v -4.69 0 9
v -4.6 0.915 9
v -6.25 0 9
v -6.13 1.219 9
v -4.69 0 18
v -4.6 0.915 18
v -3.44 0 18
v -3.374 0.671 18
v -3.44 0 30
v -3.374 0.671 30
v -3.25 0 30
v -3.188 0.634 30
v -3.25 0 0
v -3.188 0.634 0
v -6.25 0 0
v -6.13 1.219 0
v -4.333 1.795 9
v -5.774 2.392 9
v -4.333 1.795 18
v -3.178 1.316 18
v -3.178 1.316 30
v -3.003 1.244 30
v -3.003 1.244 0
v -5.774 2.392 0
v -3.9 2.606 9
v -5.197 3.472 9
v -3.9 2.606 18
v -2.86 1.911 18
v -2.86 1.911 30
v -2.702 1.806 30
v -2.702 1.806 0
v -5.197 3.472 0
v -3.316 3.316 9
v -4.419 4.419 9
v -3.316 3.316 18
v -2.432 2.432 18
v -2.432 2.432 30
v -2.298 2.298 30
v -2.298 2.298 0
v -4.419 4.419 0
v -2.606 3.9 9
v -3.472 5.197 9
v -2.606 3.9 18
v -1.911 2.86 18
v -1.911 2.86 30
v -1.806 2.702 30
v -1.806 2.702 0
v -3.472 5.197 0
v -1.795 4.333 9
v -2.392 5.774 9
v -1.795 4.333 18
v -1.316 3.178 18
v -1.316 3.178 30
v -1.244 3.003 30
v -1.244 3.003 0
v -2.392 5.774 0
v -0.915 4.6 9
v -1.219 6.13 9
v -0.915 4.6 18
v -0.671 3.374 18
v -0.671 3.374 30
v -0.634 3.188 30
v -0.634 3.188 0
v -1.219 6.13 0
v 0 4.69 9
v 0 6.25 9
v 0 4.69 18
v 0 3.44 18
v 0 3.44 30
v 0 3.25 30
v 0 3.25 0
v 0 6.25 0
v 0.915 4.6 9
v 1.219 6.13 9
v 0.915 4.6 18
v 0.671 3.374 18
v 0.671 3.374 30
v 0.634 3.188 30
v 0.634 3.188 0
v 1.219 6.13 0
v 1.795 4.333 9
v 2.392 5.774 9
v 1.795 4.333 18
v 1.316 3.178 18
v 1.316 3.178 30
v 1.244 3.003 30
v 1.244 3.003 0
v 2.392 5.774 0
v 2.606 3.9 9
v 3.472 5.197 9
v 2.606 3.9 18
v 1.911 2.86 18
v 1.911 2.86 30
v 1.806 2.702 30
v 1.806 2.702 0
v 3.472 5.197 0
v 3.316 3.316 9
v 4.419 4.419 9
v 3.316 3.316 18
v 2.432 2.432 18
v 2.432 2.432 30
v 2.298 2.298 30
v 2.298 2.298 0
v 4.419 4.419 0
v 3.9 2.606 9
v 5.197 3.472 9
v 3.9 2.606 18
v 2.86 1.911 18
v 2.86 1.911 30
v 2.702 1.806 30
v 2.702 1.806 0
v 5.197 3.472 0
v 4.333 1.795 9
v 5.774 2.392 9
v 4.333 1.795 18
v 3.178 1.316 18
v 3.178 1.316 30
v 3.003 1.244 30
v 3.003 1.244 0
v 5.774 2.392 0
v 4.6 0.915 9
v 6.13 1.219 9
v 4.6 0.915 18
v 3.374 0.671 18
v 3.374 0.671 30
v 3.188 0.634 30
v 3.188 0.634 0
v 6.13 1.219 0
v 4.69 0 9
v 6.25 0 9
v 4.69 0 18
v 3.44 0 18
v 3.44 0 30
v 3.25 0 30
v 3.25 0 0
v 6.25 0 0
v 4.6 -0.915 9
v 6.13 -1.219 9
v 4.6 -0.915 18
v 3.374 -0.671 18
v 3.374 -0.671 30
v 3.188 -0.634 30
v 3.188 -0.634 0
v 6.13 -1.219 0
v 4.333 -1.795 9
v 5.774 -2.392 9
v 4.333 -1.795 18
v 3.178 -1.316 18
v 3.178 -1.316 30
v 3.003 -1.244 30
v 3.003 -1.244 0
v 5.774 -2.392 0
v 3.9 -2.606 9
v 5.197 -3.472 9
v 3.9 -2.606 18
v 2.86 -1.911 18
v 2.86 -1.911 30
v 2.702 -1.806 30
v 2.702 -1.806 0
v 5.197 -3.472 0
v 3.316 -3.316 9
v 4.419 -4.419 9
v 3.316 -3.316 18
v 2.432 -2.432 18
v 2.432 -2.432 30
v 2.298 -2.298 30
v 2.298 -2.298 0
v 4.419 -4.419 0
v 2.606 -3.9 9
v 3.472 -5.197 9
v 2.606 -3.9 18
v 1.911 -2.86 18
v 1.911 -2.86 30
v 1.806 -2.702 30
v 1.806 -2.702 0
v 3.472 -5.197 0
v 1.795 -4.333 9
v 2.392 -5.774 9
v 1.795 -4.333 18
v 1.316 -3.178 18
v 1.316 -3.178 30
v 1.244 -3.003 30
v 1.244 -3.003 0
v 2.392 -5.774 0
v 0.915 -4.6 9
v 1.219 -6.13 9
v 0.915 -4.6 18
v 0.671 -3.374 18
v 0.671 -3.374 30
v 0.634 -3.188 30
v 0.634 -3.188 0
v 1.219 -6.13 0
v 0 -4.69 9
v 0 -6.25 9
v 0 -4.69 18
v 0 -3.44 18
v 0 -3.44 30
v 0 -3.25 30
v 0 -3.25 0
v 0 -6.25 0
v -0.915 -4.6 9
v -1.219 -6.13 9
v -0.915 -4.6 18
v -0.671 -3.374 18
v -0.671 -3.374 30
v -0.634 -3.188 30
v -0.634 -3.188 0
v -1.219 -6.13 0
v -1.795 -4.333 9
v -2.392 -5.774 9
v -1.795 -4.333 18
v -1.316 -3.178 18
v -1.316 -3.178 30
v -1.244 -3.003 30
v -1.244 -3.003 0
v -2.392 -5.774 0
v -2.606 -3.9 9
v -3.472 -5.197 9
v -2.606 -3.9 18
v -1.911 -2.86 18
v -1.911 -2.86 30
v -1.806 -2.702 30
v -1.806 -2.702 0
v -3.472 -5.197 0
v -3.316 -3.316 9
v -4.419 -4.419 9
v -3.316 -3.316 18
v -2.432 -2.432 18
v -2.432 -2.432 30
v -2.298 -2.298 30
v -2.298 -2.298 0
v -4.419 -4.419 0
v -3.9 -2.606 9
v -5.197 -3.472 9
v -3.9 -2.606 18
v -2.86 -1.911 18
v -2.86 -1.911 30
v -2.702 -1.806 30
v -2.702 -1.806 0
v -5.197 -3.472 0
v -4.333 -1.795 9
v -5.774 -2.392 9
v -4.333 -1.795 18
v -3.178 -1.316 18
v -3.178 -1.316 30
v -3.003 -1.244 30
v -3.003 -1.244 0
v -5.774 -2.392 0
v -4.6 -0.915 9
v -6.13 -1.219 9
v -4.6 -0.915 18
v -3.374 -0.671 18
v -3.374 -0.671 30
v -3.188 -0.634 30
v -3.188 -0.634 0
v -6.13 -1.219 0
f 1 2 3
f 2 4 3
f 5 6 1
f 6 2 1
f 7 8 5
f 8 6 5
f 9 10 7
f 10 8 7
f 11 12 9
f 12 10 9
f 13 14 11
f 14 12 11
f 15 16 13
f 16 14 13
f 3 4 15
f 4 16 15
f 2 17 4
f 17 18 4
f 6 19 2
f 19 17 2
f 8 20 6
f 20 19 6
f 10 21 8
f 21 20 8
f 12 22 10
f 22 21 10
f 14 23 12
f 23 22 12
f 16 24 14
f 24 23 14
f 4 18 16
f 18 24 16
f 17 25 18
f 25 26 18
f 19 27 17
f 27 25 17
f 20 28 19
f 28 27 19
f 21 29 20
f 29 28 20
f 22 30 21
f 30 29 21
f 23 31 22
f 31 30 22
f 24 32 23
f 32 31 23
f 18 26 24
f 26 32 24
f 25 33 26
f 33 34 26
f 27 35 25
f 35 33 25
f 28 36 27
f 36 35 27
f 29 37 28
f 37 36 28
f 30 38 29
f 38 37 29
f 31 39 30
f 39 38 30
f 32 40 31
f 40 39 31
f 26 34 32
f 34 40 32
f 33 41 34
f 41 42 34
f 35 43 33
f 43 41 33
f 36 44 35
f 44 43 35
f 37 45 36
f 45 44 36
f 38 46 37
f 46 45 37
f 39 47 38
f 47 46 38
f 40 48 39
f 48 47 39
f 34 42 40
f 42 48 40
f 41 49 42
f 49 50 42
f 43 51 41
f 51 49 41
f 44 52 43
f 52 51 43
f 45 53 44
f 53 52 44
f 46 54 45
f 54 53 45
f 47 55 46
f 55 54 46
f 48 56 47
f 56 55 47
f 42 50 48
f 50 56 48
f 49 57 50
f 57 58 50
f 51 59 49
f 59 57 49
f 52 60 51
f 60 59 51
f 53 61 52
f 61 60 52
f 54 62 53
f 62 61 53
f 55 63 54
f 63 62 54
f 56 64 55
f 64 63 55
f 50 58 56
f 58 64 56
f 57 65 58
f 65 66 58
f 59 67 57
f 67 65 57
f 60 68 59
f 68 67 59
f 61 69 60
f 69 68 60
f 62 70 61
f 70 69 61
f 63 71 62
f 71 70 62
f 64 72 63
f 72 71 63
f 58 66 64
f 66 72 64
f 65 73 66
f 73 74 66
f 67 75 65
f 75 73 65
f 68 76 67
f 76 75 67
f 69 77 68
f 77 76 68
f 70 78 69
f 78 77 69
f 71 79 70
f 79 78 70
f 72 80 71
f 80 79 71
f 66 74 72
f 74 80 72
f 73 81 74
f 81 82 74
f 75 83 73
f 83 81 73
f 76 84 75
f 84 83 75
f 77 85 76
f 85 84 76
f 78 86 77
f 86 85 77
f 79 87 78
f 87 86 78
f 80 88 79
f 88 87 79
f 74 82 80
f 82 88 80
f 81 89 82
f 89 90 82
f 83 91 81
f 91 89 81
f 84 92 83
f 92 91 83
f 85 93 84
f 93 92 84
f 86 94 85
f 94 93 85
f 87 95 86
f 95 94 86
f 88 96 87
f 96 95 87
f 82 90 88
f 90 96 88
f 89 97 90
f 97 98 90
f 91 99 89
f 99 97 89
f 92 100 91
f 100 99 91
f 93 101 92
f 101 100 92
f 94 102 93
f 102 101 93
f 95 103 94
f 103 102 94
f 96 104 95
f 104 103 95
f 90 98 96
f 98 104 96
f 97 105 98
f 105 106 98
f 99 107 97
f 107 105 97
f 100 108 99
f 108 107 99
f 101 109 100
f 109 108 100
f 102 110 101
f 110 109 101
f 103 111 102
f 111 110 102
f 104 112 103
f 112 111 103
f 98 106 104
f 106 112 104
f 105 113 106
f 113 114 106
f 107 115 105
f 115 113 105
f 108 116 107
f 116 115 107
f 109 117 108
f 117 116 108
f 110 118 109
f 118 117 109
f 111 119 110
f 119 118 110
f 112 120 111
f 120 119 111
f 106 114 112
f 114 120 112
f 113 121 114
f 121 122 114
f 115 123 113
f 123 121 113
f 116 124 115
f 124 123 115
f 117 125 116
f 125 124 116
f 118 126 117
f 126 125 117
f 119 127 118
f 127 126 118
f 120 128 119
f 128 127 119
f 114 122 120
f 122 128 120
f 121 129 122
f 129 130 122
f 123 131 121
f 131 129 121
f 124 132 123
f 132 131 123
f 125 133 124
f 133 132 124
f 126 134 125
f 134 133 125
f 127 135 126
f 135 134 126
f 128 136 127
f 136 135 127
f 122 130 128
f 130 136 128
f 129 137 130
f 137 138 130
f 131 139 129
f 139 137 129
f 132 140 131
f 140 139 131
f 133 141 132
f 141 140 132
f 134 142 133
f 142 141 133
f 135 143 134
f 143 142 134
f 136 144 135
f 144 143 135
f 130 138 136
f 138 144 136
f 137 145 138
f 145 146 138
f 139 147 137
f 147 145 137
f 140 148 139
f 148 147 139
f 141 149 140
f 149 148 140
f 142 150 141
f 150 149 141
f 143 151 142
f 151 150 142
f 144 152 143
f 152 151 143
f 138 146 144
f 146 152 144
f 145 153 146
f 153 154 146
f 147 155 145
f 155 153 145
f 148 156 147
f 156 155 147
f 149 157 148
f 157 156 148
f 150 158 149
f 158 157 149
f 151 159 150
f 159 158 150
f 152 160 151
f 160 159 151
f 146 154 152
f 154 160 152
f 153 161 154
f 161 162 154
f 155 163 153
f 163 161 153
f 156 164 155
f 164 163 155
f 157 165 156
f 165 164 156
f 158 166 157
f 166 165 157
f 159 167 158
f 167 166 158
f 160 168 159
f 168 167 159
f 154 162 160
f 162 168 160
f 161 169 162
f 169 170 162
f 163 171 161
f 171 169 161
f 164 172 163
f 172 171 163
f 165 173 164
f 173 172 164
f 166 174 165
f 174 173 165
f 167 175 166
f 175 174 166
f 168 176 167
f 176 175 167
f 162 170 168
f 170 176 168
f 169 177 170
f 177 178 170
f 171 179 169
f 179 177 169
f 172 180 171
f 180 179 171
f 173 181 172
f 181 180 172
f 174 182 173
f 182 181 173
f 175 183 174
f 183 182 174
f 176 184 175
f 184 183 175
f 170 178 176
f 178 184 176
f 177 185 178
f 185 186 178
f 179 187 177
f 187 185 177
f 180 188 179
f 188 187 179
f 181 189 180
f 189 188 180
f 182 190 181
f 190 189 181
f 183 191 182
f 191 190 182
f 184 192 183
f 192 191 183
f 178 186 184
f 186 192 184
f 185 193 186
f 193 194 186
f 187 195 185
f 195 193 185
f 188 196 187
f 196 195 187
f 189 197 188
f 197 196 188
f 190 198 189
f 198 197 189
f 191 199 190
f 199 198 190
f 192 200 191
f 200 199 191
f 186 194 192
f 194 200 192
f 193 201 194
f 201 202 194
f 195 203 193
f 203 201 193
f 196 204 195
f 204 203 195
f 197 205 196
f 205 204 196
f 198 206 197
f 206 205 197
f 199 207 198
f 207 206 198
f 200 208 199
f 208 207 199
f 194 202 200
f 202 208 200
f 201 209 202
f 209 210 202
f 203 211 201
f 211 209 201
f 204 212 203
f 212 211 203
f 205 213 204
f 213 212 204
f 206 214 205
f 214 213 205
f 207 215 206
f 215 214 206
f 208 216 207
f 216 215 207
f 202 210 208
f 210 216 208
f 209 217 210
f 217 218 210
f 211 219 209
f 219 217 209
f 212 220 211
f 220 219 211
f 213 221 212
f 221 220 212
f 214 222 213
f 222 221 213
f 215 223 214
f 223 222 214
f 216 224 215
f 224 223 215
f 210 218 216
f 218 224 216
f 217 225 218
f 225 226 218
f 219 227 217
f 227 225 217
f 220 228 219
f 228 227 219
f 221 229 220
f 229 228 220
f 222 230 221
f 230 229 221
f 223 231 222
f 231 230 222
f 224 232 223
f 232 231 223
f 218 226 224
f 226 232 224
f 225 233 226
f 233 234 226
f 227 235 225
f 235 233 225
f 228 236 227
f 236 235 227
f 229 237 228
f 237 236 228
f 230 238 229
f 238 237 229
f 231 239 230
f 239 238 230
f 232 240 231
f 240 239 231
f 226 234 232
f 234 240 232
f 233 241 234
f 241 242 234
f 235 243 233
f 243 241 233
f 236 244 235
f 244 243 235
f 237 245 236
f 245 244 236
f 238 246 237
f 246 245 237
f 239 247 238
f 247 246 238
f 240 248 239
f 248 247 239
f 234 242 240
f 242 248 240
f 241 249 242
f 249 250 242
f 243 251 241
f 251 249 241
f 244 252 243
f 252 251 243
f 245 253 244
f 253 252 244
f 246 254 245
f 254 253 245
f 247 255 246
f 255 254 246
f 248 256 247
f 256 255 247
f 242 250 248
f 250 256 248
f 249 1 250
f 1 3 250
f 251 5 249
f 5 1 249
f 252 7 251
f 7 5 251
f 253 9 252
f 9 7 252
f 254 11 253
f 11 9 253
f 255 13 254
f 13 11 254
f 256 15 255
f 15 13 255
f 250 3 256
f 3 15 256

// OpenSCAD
$fn = 32;

// ----------------------------------------------------------------------
// Profiled standoff: stepped spacer, 30 mm long, bore 6.5 mm
// ----------------------------------------------------------------------

// --- parameters (mm) ---
revolve_angle = 360;      // full turn around the Z axis
profile_points = 8;       // points of the closed outline

profile = [[3.25, 0], [6.25, 0], [6.25, 9], [4.69, 9], [4.69, 18], [3.44, 18], [3.44, 30], [3.25, 30]];  // single closed polygon, 8 points, counter clockwise

// --- the one profile operation ---
rotate_extrude(angle = revolve_angle) polygon(points = profile);
